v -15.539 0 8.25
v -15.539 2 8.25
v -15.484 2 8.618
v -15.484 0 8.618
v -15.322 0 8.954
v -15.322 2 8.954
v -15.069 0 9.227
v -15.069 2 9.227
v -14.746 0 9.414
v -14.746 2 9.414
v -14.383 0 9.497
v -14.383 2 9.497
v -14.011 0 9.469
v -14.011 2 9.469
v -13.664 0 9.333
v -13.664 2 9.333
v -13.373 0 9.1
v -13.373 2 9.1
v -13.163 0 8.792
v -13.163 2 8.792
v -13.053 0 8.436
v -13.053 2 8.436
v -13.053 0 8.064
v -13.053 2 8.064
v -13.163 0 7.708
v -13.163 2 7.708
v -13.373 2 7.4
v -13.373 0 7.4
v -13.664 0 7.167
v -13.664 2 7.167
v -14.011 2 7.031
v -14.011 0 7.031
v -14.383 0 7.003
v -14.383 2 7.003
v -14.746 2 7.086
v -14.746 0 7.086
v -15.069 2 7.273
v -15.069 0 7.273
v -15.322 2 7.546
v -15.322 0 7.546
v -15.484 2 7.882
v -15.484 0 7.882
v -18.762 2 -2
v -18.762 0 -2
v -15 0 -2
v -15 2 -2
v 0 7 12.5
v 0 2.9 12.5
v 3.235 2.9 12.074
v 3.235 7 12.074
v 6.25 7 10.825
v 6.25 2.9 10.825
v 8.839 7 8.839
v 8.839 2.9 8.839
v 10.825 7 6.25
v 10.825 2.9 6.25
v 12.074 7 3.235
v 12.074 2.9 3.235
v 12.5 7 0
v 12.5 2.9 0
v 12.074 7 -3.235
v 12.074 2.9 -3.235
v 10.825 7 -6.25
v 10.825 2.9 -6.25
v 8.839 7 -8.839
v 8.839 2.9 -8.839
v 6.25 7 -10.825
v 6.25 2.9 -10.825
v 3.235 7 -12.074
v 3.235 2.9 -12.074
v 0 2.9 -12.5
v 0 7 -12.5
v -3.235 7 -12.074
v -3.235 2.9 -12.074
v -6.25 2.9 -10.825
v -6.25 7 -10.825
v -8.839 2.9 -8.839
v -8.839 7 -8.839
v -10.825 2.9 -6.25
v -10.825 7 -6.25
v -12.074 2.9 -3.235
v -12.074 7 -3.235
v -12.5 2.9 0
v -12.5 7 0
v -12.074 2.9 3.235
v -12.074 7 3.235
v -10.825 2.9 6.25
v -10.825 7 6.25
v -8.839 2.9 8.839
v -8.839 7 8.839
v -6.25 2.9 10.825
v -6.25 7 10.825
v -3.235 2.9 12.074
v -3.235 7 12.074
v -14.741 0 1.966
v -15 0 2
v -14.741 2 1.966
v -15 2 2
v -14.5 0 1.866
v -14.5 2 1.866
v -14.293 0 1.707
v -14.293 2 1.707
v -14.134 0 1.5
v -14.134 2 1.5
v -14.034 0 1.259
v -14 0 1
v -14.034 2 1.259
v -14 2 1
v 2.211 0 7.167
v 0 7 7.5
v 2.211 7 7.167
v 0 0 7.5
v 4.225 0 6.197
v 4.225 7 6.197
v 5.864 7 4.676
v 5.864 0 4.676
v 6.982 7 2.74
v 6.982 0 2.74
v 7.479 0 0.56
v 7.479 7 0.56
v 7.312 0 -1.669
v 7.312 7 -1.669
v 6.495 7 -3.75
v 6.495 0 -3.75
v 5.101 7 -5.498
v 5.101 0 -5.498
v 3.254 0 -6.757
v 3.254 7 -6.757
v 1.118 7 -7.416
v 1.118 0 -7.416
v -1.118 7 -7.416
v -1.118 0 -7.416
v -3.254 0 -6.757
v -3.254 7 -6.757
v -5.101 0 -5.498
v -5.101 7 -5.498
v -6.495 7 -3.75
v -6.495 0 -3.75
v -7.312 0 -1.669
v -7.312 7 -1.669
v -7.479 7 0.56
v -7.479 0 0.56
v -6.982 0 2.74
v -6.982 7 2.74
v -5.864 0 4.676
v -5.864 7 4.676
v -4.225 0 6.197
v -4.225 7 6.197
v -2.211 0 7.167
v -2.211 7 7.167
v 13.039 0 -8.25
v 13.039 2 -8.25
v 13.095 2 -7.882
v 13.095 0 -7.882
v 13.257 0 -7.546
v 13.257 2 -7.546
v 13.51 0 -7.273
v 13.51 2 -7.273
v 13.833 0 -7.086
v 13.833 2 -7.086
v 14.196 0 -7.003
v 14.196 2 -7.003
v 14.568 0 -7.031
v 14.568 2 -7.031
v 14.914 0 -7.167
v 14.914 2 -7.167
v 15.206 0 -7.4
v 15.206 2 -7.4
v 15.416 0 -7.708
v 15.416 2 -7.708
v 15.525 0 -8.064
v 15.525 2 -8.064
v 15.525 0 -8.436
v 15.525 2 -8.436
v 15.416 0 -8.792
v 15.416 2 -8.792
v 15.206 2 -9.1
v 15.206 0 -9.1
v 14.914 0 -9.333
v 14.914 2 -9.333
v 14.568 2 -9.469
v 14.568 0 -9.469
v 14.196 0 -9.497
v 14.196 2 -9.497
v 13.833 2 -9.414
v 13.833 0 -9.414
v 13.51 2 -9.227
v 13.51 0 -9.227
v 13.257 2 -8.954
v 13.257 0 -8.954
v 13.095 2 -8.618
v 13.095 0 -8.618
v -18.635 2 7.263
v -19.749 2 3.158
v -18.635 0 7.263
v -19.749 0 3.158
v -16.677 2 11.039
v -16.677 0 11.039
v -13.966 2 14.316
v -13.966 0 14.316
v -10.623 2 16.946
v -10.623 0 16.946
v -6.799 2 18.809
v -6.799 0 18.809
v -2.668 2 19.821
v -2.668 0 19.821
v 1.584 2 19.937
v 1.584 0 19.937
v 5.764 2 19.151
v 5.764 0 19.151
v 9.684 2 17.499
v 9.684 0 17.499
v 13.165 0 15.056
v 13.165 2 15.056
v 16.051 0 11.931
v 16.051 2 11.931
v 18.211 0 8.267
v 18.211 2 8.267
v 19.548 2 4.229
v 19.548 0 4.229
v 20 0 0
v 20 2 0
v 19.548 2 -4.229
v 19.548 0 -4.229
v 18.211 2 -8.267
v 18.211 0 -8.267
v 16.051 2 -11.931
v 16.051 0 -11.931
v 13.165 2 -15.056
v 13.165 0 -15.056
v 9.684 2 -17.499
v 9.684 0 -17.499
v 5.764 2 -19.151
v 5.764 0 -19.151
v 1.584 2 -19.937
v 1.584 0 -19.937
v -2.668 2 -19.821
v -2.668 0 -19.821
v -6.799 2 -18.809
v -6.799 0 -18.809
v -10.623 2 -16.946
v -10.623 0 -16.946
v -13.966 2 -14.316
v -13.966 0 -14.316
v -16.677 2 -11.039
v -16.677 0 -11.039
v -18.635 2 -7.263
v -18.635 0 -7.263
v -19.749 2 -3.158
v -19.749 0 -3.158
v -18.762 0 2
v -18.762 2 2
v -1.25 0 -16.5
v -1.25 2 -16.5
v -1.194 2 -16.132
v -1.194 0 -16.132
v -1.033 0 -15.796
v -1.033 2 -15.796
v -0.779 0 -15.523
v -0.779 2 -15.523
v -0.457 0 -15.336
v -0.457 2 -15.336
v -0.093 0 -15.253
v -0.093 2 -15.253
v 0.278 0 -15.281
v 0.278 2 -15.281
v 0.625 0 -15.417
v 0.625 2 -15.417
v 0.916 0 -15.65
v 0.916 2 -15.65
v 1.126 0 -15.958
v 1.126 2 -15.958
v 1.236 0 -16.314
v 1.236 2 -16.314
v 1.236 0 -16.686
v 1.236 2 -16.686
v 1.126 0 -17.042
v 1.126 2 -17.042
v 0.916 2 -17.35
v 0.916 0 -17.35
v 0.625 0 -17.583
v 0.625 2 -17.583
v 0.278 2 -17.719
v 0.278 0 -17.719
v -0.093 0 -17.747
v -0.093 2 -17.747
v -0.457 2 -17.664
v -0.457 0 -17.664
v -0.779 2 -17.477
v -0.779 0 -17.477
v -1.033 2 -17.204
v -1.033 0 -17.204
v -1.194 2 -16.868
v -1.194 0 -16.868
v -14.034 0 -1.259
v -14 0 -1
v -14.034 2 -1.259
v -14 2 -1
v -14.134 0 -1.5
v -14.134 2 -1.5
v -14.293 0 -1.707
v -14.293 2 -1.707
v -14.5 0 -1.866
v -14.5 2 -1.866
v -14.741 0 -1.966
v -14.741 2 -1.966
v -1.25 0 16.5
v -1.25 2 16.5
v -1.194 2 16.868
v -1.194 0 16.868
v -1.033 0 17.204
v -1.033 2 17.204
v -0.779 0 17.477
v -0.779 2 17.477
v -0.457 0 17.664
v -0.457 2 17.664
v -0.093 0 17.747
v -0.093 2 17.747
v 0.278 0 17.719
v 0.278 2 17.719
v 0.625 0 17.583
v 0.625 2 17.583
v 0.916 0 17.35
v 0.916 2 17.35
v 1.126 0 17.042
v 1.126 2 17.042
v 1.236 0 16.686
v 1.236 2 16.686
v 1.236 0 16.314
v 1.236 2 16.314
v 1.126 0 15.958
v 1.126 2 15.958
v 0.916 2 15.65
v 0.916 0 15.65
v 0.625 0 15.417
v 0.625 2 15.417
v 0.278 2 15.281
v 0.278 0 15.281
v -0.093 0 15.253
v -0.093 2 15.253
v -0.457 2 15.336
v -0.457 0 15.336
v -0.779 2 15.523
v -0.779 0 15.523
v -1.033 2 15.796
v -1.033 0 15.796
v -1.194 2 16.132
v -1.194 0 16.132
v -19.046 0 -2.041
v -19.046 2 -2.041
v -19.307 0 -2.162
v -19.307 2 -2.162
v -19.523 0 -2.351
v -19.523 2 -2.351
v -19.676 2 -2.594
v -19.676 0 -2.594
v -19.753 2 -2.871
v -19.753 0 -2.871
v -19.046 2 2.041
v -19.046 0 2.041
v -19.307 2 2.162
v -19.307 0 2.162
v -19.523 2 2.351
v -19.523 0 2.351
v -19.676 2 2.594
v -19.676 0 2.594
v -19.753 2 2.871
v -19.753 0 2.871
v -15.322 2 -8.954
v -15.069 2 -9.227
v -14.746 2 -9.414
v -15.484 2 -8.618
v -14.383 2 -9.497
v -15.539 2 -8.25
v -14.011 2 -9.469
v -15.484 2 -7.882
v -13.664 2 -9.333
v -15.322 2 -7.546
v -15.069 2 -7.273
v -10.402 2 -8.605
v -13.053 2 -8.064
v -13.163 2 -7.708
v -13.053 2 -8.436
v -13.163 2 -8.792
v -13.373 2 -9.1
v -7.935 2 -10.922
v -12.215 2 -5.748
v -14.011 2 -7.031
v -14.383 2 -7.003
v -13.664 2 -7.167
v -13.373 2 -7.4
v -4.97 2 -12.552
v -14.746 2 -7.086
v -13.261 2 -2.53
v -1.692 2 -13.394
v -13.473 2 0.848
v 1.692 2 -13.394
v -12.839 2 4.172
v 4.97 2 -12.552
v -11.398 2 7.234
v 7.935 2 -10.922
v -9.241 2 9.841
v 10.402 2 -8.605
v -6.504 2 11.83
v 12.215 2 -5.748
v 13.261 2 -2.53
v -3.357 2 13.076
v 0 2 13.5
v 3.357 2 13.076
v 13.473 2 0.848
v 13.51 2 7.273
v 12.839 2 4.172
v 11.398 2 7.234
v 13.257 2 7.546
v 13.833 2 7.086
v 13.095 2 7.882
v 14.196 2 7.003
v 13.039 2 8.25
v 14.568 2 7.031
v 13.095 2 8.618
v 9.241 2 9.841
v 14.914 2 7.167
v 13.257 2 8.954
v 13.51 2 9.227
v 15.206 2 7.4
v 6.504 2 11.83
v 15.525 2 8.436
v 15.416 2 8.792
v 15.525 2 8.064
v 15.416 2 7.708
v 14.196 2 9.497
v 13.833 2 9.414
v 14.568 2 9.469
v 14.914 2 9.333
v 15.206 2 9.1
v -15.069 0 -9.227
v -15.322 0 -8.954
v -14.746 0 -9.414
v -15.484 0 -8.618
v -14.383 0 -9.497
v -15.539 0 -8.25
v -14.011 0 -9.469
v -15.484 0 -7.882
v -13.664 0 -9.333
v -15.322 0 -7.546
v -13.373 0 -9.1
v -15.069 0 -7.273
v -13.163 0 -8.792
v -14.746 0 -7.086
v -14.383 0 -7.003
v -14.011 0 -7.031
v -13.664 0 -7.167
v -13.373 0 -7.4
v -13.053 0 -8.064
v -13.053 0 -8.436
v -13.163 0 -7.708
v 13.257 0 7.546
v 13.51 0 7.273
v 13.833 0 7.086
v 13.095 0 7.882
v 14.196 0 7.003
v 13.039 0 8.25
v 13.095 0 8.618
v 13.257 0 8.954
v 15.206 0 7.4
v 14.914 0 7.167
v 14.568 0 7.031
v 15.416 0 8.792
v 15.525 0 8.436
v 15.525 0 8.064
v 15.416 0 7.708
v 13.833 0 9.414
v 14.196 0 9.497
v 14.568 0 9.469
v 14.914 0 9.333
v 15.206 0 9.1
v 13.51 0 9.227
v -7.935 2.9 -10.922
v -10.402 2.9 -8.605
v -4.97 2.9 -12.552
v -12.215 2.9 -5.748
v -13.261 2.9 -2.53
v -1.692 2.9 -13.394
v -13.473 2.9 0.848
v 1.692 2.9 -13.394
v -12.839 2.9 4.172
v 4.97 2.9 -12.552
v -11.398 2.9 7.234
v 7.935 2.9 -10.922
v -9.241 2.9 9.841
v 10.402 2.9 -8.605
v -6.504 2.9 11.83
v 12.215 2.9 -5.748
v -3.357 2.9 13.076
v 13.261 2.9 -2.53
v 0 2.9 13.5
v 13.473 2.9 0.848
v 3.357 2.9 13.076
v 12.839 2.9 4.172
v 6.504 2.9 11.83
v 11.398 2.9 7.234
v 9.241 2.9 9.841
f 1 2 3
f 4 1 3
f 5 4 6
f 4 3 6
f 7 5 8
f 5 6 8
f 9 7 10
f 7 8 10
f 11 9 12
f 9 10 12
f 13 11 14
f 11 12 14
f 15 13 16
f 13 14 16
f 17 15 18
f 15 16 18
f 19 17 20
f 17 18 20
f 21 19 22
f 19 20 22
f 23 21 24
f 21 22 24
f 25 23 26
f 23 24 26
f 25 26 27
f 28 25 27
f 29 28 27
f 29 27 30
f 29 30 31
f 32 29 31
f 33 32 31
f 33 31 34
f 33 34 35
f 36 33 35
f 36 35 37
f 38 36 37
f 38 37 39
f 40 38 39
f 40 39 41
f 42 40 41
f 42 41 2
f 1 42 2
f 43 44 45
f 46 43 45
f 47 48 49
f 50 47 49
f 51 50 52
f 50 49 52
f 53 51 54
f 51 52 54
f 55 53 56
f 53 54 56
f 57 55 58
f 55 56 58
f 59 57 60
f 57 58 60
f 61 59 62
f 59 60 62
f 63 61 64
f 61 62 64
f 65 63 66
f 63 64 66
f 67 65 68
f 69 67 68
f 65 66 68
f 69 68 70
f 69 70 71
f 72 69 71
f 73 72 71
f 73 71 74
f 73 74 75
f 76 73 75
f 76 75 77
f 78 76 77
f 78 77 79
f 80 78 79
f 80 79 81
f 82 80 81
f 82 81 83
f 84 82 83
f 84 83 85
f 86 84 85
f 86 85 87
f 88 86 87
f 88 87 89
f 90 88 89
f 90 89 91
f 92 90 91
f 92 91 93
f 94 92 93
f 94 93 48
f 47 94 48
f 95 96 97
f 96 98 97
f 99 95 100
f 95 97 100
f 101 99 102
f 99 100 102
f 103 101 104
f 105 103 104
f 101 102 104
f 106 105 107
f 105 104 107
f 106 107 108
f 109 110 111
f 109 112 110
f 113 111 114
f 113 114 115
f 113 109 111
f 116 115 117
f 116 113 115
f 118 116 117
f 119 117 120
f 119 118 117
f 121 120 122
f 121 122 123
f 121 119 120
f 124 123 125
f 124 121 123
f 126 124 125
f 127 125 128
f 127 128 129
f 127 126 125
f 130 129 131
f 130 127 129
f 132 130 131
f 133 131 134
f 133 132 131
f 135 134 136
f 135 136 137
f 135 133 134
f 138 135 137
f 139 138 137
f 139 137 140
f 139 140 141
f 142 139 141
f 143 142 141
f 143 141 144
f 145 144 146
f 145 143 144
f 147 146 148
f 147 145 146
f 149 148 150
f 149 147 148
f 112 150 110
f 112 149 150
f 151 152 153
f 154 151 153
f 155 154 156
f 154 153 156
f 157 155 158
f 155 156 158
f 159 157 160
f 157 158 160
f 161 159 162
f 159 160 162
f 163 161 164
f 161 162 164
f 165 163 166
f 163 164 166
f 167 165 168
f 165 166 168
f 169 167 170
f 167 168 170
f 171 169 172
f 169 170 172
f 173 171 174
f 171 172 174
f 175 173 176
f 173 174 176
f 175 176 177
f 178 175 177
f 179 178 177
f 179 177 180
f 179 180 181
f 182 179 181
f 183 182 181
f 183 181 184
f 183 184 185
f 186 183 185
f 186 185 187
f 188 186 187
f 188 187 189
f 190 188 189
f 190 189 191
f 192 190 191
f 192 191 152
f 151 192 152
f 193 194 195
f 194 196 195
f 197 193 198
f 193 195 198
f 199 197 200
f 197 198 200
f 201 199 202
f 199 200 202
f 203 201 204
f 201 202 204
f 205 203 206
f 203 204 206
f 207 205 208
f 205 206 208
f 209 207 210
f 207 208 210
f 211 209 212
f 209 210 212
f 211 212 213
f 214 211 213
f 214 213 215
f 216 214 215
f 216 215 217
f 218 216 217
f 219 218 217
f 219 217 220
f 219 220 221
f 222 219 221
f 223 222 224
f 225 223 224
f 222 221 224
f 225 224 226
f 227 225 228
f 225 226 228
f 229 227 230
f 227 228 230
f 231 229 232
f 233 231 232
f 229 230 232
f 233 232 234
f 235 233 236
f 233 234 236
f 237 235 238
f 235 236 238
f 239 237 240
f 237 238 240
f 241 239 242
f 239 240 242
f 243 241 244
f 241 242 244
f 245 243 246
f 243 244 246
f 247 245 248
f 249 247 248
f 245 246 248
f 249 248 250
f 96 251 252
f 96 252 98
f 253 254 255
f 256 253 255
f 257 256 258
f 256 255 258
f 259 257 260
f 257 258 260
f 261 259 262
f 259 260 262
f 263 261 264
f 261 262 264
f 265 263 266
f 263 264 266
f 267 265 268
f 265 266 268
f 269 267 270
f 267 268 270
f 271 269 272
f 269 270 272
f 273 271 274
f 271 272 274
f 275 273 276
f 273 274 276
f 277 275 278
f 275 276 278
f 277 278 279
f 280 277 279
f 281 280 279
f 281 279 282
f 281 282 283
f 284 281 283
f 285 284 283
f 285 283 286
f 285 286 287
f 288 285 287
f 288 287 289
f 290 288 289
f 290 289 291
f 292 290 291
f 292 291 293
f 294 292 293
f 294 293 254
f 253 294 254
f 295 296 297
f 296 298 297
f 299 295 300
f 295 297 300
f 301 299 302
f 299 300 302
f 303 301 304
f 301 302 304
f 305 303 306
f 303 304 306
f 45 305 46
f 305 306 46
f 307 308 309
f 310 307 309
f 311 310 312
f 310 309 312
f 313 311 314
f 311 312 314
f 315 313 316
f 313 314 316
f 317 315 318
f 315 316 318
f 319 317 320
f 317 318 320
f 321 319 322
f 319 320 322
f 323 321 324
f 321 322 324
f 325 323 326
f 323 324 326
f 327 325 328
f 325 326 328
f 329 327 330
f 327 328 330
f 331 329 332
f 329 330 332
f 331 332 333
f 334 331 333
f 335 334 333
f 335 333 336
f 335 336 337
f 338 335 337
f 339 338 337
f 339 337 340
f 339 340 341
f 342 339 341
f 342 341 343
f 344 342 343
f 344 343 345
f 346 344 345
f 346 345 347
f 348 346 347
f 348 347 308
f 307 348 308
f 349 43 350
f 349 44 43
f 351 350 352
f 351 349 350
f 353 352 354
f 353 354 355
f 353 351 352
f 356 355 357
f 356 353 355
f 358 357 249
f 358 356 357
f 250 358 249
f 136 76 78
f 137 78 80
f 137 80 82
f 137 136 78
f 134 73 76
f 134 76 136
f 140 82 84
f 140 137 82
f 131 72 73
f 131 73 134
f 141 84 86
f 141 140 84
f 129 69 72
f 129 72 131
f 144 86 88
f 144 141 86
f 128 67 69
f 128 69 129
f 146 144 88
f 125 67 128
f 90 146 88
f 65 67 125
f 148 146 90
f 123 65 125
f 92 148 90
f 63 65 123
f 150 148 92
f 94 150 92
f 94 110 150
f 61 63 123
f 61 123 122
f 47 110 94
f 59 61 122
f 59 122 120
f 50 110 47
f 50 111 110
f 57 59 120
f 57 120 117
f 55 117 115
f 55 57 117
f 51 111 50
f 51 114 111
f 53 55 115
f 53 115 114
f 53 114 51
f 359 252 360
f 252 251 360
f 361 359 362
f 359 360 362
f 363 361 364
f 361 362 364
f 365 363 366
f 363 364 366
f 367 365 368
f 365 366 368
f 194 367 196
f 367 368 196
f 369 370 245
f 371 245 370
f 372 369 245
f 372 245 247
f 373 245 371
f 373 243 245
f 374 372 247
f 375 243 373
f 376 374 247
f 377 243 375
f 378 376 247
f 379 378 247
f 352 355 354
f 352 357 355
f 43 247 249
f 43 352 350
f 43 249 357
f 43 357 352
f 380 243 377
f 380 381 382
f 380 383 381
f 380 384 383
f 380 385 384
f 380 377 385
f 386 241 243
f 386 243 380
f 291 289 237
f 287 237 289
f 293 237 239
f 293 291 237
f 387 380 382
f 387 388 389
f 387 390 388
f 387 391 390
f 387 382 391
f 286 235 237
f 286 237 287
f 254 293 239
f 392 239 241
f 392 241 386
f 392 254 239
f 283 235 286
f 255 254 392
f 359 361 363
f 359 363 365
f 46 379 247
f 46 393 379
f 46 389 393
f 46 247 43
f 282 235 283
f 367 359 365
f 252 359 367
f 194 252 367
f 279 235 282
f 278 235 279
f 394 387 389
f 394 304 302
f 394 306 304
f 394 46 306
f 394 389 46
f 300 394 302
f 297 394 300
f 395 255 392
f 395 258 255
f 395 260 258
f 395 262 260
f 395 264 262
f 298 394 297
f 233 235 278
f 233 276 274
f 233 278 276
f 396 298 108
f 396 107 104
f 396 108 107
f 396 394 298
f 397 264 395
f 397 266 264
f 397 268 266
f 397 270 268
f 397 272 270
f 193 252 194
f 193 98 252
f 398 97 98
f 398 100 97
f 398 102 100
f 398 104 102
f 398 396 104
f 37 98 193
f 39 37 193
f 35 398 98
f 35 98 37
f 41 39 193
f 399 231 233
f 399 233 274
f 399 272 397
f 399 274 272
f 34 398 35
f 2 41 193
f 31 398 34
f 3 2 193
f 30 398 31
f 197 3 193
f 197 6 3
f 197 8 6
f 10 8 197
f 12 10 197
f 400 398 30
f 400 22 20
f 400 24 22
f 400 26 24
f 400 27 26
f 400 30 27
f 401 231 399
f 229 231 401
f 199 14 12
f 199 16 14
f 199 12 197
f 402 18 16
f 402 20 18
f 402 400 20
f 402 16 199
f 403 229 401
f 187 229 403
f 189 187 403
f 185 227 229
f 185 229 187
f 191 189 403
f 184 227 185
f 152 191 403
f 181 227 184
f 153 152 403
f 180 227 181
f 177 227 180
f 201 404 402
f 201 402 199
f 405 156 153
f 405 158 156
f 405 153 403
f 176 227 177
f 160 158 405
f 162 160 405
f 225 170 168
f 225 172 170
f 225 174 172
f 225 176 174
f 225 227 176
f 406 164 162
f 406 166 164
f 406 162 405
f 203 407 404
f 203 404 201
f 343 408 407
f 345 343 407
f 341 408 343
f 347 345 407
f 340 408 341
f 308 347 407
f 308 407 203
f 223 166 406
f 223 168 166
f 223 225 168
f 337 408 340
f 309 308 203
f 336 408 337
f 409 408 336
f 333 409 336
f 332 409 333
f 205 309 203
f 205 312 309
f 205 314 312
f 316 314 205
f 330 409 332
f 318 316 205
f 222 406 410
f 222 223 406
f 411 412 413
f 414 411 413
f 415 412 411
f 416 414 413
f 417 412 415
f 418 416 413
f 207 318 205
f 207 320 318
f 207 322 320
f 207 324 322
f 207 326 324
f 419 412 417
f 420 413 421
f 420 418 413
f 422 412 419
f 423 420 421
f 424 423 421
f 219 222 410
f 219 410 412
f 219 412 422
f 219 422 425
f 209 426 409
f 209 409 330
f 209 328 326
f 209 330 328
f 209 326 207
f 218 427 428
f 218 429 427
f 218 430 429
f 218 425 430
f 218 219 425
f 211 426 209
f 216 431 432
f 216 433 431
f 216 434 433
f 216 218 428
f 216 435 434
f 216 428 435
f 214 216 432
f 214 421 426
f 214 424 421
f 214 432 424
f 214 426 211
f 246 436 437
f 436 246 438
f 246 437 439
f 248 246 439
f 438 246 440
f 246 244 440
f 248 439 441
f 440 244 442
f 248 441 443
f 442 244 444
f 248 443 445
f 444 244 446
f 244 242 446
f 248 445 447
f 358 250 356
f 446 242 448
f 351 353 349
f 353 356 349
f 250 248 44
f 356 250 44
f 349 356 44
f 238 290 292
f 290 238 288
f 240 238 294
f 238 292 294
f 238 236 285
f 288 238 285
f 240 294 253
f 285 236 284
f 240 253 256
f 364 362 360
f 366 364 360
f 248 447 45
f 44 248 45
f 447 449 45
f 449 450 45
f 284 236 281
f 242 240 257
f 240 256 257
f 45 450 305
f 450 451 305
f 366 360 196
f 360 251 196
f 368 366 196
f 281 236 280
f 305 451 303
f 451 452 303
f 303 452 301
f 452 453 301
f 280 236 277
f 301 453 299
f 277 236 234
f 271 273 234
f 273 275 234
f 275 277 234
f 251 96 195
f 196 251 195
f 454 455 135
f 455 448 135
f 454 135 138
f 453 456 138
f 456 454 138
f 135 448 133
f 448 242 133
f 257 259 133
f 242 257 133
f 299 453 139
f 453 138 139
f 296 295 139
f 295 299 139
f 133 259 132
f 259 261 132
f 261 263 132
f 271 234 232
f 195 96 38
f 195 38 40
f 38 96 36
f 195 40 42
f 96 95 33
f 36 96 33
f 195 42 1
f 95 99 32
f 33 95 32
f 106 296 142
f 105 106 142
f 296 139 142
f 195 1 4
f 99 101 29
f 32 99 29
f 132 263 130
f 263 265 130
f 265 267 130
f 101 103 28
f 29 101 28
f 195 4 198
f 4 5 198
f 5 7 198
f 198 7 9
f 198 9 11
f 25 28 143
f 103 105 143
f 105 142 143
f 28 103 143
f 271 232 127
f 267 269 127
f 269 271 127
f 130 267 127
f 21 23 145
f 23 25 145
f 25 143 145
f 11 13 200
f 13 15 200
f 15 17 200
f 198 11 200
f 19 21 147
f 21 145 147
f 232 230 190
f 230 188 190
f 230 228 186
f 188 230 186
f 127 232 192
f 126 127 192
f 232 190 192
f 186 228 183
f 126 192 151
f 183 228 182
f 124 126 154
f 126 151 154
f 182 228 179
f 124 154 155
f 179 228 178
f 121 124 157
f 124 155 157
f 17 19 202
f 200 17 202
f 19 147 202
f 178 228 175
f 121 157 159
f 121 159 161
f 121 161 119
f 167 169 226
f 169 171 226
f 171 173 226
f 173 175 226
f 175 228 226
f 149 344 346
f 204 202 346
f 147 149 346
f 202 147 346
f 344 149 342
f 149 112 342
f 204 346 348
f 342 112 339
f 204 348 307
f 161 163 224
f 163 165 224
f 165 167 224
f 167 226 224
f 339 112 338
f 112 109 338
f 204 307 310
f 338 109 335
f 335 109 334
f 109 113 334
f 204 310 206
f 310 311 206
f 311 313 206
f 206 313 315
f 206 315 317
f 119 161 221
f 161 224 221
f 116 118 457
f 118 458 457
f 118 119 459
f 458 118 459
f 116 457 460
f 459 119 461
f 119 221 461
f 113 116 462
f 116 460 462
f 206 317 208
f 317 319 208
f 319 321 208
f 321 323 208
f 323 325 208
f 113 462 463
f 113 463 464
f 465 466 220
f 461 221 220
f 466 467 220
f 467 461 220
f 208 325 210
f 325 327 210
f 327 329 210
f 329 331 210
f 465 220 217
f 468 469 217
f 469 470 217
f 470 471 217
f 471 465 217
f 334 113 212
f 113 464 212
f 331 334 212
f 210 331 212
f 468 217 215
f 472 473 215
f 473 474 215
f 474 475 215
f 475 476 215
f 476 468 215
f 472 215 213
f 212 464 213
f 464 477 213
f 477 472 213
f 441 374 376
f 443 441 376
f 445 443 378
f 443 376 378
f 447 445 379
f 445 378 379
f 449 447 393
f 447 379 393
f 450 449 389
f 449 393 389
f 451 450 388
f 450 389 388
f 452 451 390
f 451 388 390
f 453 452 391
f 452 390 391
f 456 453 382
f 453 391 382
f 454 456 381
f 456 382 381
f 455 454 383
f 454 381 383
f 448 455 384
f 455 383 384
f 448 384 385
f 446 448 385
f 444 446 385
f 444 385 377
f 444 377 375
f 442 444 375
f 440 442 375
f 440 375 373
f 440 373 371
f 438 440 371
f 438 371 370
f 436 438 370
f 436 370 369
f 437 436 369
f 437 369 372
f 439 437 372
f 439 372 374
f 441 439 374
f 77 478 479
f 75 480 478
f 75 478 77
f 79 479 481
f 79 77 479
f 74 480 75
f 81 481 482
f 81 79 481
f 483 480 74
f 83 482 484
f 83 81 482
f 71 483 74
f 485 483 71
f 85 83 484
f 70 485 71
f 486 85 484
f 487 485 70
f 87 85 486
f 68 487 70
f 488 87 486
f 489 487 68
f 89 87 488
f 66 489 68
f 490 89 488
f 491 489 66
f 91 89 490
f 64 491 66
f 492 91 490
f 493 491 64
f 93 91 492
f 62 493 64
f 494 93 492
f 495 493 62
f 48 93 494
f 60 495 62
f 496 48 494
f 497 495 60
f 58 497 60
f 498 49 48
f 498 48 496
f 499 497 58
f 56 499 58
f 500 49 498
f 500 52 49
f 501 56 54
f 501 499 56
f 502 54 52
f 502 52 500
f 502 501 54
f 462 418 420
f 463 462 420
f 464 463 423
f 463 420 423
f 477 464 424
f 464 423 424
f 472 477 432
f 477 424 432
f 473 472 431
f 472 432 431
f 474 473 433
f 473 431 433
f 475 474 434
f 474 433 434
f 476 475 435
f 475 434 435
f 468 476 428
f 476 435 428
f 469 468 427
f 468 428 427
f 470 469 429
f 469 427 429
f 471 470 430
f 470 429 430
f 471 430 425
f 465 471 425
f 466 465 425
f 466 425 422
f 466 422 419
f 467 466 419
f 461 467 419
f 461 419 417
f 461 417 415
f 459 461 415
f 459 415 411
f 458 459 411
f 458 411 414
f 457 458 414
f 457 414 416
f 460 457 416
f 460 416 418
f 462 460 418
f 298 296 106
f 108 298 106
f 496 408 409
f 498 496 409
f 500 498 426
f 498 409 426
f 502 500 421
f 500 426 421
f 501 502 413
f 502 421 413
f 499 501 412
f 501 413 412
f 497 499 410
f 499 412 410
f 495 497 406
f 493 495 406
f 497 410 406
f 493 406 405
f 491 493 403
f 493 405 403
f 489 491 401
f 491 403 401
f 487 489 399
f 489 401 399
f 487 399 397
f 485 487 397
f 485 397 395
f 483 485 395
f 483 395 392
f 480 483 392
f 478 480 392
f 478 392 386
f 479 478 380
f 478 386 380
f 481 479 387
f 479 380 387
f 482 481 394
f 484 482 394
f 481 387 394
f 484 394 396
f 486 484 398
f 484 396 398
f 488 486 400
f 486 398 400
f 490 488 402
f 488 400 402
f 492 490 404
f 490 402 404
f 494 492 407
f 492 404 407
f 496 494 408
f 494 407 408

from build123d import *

# Parameters (mm, degrees)
SKETCH_1_R          = 20
SKETCH_1_R_2        = 7.5
SKETCH_1_R_3        = 1
EXTRUDE_1_DEPTH     = 2
SKETCH_2_R          = 12.5
SKETCH_2_R_2        = 7.5
EXTRUDE_2_DEPTH     = 5
SKETCH_3_R          = 13.5
SKETCH_3_R_2        = 12.5
EXTRUDE_3_DEPTH     = 0.9
SKETCH_4_W          = 9.188934261
SKETCH_4_H          = 4
CUT_EXTRUDE_1_DEPTH = 10
FILLET_1_R          = 1
HOLE_WIZARD_M3_1_D  = 2.5


with BuildPart() as part:
    # 草图1 → 凸台-拉伸1 (new body)
    with BuildSketch(Plane(origin=(0, 0, 0), x_dir=(1, 0, 0), z_dir=(0, 1, 0))):
        with Locations(Location((0, 0, 0), (0, 0, 270))):
            Circle(SKETCH_1_R)
        with Locations(Location((0, 0, 0), (0, 0, 270))):
            Circle(SKETCH_1_R_2, mode=Mode.SUBTRACT)
        with Locations(Location((0, 16.5, 0), (0, 0, 270))):
            Circle(SKETCH_1_R_3, mode=Mode.SUBTRACT)
        with Locations(Location((14.289419162, 8.25, 0), (0, 0, 270))):
            Circle(SKETCH_1_R_3, mode=Mode.SUBTRACT)
        with Locations(Location((14.289419162, -8.25, 0), (0, 0, 270))):
            Circle(SKETCH_1_R_3, mode=Mode.SUBTRACT)
        with Locations(Location((0, -16.5, 0), (0, 0, 270))):
            Circle(SKETCH_1_R_3, mode=Mode.SUBTRACT)
        with Locations(Location((-14.289419162, -8.25, 0), (0, 0, 270))):
            Circle(SKETCH_1_R_3, mode=Mode.SUBTRACT)
        with Locations(Location((-14.289419162, 8.25, 0), (0, 0, 270))):
            Circle(SKETCH_1_R_3, mode=Mode.SUBTRACT)
    extrude(amount=EXTRUDE_1_DEPTH)

    # 草图2 → 凸台-拉伸2 (add)
    with BuildSketch(Plane(origin=(0, 2, 0), x_dir=(1, 0, 0), z_dir=(0, 1, 0))):
        with Locations(Location((0, 0, 0), (0, 0, 270))):
            Circle(SKETCH_2_R)
        with Locations(Location((0, 0, 0), (0, 0, 270))):
            Circle(SKETCH_2_R_2, mode=Mode.SUBTRACT)
    extrude(amount=EXTRUDE_2_DEPTH)

    # 草图3 → 凸台-拉伸3 (add)
    with BuildSketch(Plane(origin=(0, 2, 0), x_dir=(1, 0, 0), z_dir=(0, 1, 0))):
        with Locations(Location((0, 0, 0), (0, 0, 270))):
            Circle(SKETCH_3_R)
        with Locations(Location((0, 0, 0), (0, 0, 270))):
            Circle(SKETCH_3_R_2, mode=Mode.SUBTRACT)
    extrude(amount=EXTRUDE_3_DEPTH)

    # 草图4 → 切除-拉伸1 (cut)
    with BuildSketch(Plane.XZ):
        with Locations((-18.59446713, 0)):
            Rectangle(SKETCH_4_W, SKETCH_4_H)
    extrude(amount=-CUT_EXTRUDE_1_DEPTH, mode=Mode.SUBTRACT)

    # 圆角1
    fillet_1_edges = [part.edges().sort_by_distance(p)[0] for p in [
        (-19.899748742, 1, -2),
        (-19.899748742, 1, 2),
        (-14, 1, 2),
        (-14, 1, -2),
    ]]
    fillet(fillet_1_edges, radius=FILLET_1_R)

    # M3 螺纹孔1 (through all)
    with Locations(Plane.XZ):
        with Locations((-14.289419162, 8.25), (0, 16.5), (14.289419162, 8.25), (14.289419162, -8.25), (0, -16.5), (-14.289419162, -8.25)):
            Hole(HOLE_WIZARD_M3_1_D / 2)


solid = part.part
